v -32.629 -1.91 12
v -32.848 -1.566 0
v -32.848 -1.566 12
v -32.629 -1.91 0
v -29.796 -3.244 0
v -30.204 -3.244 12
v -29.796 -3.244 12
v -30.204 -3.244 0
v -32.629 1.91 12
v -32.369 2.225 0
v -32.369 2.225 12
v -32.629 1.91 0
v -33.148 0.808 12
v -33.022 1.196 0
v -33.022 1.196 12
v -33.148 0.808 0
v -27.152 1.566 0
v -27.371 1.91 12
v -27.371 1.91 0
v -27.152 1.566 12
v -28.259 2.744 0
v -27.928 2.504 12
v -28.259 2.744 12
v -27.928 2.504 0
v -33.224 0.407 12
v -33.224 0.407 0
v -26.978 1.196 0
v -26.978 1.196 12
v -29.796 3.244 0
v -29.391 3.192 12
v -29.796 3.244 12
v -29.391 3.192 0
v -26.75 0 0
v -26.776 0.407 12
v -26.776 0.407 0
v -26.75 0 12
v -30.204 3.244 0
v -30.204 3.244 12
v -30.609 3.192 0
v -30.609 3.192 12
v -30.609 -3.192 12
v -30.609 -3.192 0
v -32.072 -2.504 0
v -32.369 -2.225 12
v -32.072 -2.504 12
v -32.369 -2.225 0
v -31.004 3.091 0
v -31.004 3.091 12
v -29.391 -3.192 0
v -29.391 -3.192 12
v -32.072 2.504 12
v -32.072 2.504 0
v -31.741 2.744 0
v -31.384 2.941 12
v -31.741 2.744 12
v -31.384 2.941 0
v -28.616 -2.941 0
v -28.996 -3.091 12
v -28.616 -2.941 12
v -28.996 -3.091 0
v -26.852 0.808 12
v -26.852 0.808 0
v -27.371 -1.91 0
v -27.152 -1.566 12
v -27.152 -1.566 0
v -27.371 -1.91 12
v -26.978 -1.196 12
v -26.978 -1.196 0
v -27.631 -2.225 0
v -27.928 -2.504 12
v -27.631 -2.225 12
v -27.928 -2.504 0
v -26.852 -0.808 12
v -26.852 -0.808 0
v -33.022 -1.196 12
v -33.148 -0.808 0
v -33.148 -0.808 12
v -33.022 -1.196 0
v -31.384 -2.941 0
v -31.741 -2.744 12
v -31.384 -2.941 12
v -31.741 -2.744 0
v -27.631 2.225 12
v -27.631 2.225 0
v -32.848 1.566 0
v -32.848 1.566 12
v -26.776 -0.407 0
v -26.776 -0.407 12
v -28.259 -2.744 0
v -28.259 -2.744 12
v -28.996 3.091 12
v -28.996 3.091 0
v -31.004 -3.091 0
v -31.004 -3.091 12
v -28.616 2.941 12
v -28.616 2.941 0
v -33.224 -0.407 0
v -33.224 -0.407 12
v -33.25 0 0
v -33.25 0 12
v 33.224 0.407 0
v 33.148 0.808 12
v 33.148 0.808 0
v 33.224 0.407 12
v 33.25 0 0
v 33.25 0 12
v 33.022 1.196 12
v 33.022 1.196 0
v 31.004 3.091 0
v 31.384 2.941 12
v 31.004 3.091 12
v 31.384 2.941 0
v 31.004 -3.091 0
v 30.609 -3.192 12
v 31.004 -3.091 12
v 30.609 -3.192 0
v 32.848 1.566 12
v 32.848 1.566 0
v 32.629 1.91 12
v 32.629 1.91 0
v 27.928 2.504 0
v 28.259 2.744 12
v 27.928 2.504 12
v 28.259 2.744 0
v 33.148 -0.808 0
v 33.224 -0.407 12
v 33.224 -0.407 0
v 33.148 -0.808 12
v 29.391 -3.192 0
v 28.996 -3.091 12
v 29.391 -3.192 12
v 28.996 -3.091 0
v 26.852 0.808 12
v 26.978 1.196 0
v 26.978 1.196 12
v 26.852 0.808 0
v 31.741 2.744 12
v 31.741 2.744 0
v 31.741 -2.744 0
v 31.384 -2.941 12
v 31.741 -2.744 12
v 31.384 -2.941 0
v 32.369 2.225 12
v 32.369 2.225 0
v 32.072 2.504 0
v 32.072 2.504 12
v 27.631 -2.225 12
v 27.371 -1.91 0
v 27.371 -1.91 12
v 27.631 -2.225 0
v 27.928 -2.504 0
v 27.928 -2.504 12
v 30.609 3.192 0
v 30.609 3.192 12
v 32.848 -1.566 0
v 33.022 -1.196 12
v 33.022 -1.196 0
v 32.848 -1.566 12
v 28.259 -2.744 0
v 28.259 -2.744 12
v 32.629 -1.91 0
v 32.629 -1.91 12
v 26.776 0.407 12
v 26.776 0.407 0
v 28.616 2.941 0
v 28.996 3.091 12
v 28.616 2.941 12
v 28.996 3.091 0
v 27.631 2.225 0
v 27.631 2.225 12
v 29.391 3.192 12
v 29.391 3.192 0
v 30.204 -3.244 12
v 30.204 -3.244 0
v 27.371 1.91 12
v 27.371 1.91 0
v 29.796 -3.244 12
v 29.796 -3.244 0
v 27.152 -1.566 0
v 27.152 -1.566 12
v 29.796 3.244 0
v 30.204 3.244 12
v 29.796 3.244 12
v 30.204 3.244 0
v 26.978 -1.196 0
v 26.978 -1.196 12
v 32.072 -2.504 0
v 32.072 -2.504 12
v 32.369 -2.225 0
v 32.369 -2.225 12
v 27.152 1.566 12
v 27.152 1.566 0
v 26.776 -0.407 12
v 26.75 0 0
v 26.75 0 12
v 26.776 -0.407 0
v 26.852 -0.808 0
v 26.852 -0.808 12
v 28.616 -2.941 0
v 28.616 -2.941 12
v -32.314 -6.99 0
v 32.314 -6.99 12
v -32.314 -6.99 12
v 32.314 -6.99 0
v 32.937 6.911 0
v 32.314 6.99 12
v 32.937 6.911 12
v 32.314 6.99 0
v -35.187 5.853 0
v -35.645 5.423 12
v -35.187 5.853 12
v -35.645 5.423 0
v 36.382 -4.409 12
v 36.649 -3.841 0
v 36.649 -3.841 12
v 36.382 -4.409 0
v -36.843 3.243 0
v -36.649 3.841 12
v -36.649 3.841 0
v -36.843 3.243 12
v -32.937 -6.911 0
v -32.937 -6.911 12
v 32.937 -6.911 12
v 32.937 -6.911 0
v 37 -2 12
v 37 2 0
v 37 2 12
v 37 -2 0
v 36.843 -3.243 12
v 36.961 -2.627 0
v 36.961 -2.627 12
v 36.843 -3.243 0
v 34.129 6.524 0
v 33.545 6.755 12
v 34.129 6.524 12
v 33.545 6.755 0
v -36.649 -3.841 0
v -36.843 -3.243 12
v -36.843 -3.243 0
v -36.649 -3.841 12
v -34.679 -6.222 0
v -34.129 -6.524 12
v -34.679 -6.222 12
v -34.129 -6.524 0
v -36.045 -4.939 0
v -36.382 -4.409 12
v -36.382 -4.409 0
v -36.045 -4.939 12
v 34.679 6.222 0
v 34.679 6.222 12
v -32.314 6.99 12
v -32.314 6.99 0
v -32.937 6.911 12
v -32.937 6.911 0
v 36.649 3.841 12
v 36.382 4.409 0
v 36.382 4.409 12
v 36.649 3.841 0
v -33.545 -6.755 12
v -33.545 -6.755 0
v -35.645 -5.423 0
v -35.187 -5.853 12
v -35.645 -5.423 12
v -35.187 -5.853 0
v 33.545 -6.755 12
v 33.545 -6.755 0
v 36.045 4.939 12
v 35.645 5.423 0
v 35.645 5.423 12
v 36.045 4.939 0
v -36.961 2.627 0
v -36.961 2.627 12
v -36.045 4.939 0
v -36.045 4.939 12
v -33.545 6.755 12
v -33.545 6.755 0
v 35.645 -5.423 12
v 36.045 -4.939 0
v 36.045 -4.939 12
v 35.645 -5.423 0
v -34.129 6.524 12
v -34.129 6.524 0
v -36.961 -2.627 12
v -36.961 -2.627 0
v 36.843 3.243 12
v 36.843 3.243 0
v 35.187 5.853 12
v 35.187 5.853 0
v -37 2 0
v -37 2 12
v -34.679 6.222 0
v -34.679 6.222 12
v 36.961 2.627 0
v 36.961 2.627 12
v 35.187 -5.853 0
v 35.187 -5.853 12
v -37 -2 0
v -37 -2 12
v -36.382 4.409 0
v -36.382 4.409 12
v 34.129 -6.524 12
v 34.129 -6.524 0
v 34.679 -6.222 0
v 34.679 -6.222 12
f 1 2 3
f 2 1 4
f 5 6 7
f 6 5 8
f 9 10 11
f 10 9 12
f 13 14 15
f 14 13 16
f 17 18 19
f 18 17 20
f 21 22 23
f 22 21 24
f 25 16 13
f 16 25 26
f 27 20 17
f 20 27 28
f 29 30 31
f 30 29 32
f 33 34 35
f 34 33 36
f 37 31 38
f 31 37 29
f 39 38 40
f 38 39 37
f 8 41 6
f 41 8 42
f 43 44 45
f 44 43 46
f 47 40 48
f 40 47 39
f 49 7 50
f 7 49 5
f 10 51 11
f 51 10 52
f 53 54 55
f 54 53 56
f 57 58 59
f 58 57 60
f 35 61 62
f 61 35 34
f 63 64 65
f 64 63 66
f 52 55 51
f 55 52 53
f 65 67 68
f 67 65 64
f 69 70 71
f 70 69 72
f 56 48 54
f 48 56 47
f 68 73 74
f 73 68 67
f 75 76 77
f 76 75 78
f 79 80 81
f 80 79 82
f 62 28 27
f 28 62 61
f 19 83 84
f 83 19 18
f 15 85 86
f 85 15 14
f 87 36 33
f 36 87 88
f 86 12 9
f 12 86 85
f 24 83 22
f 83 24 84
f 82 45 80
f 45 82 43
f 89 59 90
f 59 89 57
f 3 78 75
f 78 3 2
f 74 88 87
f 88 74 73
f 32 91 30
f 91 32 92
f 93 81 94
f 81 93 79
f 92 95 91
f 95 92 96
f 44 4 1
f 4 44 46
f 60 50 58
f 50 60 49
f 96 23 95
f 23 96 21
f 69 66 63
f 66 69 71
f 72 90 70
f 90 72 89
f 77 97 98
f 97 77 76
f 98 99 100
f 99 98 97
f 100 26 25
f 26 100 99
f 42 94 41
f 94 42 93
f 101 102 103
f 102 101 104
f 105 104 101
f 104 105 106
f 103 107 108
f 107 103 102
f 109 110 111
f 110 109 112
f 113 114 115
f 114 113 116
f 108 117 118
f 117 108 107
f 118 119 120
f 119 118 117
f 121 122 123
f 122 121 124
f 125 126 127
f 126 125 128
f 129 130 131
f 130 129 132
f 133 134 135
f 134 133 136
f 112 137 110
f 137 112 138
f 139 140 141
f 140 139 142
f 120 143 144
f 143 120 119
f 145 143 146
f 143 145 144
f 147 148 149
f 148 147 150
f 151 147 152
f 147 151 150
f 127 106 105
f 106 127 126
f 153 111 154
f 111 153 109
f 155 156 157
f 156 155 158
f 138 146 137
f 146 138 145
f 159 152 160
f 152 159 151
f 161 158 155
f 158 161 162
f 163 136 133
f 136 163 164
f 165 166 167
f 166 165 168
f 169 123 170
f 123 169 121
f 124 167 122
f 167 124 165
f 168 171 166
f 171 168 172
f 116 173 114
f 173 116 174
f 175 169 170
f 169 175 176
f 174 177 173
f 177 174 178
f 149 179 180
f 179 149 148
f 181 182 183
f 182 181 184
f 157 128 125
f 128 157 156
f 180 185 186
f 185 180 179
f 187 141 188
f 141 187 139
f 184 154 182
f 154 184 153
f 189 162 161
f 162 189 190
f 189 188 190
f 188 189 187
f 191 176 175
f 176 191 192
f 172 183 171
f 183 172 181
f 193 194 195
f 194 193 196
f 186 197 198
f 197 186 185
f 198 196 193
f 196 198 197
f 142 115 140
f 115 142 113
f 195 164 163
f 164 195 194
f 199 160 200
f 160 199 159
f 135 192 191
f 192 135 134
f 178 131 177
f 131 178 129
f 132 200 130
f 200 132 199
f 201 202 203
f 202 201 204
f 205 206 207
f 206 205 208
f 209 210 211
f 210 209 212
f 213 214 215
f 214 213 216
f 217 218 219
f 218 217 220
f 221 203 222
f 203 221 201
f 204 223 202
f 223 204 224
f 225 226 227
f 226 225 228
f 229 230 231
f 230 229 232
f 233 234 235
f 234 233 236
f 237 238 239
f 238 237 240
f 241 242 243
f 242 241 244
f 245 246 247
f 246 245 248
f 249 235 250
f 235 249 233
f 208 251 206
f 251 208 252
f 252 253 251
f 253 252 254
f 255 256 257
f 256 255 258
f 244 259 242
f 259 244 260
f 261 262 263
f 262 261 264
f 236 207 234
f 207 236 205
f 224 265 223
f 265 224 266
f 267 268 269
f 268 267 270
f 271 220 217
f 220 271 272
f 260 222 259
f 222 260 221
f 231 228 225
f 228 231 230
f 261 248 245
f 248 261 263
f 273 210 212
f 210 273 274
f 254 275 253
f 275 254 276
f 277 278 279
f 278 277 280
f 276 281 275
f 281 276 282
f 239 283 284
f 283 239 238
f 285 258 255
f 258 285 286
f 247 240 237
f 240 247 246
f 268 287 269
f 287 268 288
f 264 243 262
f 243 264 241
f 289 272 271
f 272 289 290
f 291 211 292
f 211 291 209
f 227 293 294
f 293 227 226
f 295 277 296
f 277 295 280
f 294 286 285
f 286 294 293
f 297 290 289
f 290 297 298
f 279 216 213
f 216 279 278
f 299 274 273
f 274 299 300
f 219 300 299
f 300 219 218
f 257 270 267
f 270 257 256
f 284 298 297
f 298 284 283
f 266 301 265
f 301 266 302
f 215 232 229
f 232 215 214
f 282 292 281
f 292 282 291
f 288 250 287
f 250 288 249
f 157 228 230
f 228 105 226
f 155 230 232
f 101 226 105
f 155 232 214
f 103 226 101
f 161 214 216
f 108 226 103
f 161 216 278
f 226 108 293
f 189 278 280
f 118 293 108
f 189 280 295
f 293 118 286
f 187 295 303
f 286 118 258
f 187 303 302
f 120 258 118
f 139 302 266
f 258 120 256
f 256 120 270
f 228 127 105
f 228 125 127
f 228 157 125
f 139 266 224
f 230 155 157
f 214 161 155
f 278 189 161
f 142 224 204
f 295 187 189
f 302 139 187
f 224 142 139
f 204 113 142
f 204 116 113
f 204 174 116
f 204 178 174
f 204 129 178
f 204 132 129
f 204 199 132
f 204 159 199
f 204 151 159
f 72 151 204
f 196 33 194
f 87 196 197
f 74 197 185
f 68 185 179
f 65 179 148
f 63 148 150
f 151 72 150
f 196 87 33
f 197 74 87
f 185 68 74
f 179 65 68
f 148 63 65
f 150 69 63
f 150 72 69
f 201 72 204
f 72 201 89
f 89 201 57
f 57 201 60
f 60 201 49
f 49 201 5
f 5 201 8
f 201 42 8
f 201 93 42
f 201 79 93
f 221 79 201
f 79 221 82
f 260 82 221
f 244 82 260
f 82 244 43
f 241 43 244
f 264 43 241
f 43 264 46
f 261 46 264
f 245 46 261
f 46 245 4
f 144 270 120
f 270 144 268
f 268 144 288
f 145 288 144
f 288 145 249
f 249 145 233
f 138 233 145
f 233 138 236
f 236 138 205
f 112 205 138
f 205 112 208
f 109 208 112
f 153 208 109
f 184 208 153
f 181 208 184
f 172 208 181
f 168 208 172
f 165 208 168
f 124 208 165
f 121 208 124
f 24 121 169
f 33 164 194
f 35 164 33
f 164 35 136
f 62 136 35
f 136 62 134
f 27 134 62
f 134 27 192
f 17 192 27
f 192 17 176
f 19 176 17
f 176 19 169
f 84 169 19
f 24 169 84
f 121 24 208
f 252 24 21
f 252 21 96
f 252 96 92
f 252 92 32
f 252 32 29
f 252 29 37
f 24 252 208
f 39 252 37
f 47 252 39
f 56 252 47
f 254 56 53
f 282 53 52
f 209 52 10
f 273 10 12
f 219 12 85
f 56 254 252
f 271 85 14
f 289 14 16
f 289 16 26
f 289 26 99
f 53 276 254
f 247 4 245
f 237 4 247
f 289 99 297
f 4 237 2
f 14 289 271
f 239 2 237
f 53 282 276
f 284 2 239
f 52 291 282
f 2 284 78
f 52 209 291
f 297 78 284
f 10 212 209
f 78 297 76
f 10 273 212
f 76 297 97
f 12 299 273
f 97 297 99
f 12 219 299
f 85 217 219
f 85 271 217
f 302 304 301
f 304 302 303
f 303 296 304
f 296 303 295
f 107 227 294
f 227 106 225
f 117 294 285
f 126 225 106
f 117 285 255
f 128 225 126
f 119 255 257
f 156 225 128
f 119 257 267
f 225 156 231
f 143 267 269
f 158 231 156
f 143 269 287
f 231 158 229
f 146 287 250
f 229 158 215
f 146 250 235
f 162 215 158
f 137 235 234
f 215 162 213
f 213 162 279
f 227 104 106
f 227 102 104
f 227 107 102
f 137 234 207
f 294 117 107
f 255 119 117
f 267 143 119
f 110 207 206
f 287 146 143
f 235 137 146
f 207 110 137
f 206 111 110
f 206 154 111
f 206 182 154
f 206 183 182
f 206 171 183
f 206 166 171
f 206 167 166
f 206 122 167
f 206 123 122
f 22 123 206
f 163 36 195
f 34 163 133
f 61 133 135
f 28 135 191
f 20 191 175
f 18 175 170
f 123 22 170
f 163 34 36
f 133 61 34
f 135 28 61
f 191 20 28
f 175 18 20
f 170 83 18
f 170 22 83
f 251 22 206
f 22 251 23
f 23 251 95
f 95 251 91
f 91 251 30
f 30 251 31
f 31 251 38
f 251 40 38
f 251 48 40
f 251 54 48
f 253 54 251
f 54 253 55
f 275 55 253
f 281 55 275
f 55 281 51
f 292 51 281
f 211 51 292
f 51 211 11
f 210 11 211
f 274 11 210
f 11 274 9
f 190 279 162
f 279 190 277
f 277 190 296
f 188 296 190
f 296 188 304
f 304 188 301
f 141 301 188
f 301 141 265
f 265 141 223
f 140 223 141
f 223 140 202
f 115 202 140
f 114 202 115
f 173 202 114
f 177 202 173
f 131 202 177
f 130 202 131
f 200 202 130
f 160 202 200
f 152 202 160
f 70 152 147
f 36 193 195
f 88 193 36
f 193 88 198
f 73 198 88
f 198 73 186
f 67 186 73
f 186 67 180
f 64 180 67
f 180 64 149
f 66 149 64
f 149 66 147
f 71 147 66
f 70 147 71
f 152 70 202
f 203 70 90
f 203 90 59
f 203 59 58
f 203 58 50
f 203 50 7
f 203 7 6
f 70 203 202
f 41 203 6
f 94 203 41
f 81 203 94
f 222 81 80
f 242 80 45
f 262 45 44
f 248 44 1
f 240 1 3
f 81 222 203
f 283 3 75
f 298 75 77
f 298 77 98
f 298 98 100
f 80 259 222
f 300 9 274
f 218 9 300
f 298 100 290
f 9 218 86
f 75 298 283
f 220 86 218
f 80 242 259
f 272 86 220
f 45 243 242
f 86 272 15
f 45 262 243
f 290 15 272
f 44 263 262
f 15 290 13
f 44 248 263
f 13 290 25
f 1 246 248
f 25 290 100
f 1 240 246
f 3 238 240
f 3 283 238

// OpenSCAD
$fn = 50;


difference() {
	union() {
		hull() {
			translate(v = [-32.0000000000, 2.0000000000, 0]) {
				cylinder(h = 12, r = 5);
			}
			translate(v = [32.0000000000, 2.0000000000, 0]) {
				cylinder(h = 12, r = 5);
			}
			translate(v = [-32.0000000000, -2.0000000000, 0]) {
				cylinder(h = 12, r = 5);
			}
			translate(v = [32.0000000000, -2.0000000000, 0]) {
				cylinder(h = 12, r = 5);
			}
		}
	}
	union() {
		translate(v = [-30.0000000000, 0.0000000000, -100.0000000000]) {
			cylinder(h = 200, r = 3.2500000000);
		}
		translate(v = [-30.0000000000, 0.0000000000, -100.0000000000]) {
			cylinder(h = 200, r = 3.2500000000);
		}
		translate(v = [30.0000000000, 0.0000000000, -100.0000000000]) {
			cylinder(h = 200, r = 3.2500000000);
		}
		translate(v = [30.0000000000, 0.0000000000, -100.0000000000]) {
			cylinder(h = 200, r = 3.2500000000);
		}
	}
}
